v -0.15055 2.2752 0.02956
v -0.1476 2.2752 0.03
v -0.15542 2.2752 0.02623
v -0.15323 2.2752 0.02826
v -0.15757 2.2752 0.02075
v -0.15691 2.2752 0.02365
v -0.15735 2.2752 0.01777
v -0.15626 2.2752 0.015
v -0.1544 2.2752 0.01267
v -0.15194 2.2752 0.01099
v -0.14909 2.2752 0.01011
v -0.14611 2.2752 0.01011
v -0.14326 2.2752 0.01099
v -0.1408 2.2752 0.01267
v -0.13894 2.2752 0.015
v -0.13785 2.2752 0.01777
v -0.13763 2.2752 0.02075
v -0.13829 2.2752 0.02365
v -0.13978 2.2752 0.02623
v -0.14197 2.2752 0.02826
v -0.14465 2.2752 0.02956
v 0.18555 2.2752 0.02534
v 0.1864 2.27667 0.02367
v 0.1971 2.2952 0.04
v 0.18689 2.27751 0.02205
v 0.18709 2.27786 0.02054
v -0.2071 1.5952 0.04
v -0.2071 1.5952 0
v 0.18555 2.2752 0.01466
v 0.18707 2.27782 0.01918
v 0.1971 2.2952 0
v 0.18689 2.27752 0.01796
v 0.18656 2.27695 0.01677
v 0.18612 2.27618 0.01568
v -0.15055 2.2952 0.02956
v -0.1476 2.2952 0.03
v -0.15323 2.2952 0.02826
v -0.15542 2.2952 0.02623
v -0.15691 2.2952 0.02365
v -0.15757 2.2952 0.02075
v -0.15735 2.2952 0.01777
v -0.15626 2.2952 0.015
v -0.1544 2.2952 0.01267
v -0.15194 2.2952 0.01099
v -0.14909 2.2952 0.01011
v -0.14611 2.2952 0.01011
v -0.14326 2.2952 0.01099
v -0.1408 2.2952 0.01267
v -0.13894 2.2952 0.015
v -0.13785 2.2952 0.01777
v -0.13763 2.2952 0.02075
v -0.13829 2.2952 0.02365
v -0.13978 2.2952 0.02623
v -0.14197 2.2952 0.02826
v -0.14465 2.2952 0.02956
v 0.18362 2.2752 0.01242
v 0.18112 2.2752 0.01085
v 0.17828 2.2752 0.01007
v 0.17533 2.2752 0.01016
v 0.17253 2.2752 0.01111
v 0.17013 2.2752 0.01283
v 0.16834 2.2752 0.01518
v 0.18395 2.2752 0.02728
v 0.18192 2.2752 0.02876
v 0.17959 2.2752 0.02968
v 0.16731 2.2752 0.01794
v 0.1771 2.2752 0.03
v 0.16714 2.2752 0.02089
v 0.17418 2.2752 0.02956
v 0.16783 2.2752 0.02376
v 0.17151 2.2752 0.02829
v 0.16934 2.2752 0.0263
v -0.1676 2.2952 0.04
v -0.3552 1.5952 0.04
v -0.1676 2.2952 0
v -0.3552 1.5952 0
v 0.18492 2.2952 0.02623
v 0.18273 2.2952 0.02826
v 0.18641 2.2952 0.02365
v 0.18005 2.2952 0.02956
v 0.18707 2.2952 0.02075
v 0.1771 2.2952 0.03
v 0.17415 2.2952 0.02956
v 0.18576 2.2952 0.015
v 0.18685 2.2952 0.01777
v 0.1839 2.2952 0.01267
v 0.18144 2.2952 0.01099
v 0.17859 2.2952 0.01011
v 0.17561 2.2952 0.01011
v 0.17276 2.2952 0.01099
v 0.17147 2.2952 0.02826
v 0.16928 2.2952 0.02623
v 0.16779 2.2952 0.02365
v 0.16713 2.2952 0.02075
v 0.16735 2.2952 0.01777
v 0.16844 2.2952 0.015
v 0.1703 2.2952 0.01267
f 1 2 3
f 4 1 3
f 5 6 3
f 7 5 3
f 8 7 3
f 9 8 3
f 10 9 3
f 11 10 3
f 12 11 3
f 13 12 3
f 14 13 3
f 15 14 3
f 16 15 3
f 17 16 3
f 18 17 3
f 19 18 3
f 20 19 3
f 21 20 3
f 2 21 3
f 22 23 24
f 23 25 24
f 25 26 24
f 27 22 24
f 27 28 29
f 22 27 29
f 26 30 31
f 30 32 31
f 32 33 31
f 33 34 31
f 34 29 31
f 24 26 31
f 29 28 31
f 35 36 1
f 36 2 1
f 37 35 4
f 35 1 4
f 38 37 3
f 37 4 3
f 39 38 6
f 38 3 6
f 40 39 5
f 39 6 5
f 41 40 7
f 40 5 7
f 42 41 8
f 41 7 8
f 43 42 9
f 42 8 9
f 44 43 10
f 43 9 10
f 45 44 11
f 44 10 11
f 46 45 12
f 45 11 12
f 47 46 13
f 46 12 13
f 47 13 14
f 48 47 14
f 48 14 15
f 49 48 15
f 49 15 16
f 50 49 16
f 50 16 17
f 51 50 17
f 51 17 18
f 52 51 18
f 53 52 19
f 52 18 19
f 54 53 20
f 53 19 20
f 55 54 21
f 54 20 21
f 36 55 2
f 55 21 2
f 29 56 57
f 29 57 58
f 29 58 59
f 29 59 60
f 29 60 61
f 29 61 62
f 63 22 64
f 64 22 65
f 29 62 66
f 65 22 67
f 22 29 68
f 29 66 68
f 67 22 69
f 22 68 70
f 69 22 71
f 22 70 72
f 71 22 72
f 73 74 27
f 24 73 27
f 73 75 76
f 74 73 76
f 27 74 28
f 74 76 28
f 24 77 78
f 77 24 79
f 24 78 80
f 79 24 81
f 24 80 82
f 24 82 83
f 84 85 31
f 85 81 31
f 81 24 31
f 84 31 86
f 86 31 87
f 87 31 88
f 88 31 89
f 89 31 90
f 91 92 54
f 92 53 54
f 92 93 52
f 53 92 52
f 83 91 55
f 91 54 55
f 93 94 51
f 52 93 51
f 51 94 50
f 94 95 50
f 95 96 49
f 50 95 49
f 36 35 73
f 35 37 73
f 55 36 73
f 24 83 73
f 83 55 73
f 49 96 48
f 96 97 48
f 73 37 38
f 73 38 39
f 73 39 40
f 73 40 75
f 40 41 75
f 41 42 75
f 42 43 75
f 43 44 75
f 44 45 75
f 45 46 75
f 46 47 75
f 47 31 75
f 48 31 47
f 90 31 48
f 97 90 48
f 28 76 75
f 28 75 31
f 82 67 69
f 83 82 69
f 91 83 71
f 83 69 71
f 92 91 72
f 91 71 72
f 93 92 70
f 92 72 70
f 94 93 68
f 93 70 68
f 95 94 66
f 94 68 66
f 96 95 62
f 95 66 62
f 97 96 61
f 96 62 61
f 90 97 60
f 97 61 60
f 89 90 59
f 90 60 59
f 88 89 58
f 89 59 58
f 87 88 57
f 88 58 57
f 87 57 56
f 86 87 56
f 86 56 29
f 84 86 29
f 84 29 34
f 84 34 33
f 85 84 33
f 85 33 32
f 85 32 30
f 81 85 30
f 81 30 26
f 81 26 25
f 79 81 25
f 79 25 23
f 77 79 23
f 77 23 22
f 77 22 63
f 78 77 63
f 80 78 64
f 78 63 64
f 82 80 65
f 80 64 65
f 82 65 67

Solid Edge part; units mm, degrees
sketch "Sketch1" plane through (0, 0, 0) normal (0, 0, 1) x (1, 0, 0)
  line L0 (-0.2071, 1.5952) -> (0.1971, 2.2952)
  line L1 (0.1971, 2.2952) -> (-0.1676, 2.2952)
  line L2 (-0.1676, 2.2952) -> (-0.3552, 1.5952)
  line L3 (-0.3552, 1.5952) -> (-0.2071, 1.5952)
extrude "Protrusion1" add sketch "Sketch1" along normal blind 0.04
hole "Bohrung_13" at (-0.1476, 2.2952, 0.02) direction (0, -1, 0) diameter 0.02 depth 0.02
hole "Hole1" at (0.1771, 2.2952, 0.02) direction (0, -1, 0) diameter 0.02 depth 0.02
